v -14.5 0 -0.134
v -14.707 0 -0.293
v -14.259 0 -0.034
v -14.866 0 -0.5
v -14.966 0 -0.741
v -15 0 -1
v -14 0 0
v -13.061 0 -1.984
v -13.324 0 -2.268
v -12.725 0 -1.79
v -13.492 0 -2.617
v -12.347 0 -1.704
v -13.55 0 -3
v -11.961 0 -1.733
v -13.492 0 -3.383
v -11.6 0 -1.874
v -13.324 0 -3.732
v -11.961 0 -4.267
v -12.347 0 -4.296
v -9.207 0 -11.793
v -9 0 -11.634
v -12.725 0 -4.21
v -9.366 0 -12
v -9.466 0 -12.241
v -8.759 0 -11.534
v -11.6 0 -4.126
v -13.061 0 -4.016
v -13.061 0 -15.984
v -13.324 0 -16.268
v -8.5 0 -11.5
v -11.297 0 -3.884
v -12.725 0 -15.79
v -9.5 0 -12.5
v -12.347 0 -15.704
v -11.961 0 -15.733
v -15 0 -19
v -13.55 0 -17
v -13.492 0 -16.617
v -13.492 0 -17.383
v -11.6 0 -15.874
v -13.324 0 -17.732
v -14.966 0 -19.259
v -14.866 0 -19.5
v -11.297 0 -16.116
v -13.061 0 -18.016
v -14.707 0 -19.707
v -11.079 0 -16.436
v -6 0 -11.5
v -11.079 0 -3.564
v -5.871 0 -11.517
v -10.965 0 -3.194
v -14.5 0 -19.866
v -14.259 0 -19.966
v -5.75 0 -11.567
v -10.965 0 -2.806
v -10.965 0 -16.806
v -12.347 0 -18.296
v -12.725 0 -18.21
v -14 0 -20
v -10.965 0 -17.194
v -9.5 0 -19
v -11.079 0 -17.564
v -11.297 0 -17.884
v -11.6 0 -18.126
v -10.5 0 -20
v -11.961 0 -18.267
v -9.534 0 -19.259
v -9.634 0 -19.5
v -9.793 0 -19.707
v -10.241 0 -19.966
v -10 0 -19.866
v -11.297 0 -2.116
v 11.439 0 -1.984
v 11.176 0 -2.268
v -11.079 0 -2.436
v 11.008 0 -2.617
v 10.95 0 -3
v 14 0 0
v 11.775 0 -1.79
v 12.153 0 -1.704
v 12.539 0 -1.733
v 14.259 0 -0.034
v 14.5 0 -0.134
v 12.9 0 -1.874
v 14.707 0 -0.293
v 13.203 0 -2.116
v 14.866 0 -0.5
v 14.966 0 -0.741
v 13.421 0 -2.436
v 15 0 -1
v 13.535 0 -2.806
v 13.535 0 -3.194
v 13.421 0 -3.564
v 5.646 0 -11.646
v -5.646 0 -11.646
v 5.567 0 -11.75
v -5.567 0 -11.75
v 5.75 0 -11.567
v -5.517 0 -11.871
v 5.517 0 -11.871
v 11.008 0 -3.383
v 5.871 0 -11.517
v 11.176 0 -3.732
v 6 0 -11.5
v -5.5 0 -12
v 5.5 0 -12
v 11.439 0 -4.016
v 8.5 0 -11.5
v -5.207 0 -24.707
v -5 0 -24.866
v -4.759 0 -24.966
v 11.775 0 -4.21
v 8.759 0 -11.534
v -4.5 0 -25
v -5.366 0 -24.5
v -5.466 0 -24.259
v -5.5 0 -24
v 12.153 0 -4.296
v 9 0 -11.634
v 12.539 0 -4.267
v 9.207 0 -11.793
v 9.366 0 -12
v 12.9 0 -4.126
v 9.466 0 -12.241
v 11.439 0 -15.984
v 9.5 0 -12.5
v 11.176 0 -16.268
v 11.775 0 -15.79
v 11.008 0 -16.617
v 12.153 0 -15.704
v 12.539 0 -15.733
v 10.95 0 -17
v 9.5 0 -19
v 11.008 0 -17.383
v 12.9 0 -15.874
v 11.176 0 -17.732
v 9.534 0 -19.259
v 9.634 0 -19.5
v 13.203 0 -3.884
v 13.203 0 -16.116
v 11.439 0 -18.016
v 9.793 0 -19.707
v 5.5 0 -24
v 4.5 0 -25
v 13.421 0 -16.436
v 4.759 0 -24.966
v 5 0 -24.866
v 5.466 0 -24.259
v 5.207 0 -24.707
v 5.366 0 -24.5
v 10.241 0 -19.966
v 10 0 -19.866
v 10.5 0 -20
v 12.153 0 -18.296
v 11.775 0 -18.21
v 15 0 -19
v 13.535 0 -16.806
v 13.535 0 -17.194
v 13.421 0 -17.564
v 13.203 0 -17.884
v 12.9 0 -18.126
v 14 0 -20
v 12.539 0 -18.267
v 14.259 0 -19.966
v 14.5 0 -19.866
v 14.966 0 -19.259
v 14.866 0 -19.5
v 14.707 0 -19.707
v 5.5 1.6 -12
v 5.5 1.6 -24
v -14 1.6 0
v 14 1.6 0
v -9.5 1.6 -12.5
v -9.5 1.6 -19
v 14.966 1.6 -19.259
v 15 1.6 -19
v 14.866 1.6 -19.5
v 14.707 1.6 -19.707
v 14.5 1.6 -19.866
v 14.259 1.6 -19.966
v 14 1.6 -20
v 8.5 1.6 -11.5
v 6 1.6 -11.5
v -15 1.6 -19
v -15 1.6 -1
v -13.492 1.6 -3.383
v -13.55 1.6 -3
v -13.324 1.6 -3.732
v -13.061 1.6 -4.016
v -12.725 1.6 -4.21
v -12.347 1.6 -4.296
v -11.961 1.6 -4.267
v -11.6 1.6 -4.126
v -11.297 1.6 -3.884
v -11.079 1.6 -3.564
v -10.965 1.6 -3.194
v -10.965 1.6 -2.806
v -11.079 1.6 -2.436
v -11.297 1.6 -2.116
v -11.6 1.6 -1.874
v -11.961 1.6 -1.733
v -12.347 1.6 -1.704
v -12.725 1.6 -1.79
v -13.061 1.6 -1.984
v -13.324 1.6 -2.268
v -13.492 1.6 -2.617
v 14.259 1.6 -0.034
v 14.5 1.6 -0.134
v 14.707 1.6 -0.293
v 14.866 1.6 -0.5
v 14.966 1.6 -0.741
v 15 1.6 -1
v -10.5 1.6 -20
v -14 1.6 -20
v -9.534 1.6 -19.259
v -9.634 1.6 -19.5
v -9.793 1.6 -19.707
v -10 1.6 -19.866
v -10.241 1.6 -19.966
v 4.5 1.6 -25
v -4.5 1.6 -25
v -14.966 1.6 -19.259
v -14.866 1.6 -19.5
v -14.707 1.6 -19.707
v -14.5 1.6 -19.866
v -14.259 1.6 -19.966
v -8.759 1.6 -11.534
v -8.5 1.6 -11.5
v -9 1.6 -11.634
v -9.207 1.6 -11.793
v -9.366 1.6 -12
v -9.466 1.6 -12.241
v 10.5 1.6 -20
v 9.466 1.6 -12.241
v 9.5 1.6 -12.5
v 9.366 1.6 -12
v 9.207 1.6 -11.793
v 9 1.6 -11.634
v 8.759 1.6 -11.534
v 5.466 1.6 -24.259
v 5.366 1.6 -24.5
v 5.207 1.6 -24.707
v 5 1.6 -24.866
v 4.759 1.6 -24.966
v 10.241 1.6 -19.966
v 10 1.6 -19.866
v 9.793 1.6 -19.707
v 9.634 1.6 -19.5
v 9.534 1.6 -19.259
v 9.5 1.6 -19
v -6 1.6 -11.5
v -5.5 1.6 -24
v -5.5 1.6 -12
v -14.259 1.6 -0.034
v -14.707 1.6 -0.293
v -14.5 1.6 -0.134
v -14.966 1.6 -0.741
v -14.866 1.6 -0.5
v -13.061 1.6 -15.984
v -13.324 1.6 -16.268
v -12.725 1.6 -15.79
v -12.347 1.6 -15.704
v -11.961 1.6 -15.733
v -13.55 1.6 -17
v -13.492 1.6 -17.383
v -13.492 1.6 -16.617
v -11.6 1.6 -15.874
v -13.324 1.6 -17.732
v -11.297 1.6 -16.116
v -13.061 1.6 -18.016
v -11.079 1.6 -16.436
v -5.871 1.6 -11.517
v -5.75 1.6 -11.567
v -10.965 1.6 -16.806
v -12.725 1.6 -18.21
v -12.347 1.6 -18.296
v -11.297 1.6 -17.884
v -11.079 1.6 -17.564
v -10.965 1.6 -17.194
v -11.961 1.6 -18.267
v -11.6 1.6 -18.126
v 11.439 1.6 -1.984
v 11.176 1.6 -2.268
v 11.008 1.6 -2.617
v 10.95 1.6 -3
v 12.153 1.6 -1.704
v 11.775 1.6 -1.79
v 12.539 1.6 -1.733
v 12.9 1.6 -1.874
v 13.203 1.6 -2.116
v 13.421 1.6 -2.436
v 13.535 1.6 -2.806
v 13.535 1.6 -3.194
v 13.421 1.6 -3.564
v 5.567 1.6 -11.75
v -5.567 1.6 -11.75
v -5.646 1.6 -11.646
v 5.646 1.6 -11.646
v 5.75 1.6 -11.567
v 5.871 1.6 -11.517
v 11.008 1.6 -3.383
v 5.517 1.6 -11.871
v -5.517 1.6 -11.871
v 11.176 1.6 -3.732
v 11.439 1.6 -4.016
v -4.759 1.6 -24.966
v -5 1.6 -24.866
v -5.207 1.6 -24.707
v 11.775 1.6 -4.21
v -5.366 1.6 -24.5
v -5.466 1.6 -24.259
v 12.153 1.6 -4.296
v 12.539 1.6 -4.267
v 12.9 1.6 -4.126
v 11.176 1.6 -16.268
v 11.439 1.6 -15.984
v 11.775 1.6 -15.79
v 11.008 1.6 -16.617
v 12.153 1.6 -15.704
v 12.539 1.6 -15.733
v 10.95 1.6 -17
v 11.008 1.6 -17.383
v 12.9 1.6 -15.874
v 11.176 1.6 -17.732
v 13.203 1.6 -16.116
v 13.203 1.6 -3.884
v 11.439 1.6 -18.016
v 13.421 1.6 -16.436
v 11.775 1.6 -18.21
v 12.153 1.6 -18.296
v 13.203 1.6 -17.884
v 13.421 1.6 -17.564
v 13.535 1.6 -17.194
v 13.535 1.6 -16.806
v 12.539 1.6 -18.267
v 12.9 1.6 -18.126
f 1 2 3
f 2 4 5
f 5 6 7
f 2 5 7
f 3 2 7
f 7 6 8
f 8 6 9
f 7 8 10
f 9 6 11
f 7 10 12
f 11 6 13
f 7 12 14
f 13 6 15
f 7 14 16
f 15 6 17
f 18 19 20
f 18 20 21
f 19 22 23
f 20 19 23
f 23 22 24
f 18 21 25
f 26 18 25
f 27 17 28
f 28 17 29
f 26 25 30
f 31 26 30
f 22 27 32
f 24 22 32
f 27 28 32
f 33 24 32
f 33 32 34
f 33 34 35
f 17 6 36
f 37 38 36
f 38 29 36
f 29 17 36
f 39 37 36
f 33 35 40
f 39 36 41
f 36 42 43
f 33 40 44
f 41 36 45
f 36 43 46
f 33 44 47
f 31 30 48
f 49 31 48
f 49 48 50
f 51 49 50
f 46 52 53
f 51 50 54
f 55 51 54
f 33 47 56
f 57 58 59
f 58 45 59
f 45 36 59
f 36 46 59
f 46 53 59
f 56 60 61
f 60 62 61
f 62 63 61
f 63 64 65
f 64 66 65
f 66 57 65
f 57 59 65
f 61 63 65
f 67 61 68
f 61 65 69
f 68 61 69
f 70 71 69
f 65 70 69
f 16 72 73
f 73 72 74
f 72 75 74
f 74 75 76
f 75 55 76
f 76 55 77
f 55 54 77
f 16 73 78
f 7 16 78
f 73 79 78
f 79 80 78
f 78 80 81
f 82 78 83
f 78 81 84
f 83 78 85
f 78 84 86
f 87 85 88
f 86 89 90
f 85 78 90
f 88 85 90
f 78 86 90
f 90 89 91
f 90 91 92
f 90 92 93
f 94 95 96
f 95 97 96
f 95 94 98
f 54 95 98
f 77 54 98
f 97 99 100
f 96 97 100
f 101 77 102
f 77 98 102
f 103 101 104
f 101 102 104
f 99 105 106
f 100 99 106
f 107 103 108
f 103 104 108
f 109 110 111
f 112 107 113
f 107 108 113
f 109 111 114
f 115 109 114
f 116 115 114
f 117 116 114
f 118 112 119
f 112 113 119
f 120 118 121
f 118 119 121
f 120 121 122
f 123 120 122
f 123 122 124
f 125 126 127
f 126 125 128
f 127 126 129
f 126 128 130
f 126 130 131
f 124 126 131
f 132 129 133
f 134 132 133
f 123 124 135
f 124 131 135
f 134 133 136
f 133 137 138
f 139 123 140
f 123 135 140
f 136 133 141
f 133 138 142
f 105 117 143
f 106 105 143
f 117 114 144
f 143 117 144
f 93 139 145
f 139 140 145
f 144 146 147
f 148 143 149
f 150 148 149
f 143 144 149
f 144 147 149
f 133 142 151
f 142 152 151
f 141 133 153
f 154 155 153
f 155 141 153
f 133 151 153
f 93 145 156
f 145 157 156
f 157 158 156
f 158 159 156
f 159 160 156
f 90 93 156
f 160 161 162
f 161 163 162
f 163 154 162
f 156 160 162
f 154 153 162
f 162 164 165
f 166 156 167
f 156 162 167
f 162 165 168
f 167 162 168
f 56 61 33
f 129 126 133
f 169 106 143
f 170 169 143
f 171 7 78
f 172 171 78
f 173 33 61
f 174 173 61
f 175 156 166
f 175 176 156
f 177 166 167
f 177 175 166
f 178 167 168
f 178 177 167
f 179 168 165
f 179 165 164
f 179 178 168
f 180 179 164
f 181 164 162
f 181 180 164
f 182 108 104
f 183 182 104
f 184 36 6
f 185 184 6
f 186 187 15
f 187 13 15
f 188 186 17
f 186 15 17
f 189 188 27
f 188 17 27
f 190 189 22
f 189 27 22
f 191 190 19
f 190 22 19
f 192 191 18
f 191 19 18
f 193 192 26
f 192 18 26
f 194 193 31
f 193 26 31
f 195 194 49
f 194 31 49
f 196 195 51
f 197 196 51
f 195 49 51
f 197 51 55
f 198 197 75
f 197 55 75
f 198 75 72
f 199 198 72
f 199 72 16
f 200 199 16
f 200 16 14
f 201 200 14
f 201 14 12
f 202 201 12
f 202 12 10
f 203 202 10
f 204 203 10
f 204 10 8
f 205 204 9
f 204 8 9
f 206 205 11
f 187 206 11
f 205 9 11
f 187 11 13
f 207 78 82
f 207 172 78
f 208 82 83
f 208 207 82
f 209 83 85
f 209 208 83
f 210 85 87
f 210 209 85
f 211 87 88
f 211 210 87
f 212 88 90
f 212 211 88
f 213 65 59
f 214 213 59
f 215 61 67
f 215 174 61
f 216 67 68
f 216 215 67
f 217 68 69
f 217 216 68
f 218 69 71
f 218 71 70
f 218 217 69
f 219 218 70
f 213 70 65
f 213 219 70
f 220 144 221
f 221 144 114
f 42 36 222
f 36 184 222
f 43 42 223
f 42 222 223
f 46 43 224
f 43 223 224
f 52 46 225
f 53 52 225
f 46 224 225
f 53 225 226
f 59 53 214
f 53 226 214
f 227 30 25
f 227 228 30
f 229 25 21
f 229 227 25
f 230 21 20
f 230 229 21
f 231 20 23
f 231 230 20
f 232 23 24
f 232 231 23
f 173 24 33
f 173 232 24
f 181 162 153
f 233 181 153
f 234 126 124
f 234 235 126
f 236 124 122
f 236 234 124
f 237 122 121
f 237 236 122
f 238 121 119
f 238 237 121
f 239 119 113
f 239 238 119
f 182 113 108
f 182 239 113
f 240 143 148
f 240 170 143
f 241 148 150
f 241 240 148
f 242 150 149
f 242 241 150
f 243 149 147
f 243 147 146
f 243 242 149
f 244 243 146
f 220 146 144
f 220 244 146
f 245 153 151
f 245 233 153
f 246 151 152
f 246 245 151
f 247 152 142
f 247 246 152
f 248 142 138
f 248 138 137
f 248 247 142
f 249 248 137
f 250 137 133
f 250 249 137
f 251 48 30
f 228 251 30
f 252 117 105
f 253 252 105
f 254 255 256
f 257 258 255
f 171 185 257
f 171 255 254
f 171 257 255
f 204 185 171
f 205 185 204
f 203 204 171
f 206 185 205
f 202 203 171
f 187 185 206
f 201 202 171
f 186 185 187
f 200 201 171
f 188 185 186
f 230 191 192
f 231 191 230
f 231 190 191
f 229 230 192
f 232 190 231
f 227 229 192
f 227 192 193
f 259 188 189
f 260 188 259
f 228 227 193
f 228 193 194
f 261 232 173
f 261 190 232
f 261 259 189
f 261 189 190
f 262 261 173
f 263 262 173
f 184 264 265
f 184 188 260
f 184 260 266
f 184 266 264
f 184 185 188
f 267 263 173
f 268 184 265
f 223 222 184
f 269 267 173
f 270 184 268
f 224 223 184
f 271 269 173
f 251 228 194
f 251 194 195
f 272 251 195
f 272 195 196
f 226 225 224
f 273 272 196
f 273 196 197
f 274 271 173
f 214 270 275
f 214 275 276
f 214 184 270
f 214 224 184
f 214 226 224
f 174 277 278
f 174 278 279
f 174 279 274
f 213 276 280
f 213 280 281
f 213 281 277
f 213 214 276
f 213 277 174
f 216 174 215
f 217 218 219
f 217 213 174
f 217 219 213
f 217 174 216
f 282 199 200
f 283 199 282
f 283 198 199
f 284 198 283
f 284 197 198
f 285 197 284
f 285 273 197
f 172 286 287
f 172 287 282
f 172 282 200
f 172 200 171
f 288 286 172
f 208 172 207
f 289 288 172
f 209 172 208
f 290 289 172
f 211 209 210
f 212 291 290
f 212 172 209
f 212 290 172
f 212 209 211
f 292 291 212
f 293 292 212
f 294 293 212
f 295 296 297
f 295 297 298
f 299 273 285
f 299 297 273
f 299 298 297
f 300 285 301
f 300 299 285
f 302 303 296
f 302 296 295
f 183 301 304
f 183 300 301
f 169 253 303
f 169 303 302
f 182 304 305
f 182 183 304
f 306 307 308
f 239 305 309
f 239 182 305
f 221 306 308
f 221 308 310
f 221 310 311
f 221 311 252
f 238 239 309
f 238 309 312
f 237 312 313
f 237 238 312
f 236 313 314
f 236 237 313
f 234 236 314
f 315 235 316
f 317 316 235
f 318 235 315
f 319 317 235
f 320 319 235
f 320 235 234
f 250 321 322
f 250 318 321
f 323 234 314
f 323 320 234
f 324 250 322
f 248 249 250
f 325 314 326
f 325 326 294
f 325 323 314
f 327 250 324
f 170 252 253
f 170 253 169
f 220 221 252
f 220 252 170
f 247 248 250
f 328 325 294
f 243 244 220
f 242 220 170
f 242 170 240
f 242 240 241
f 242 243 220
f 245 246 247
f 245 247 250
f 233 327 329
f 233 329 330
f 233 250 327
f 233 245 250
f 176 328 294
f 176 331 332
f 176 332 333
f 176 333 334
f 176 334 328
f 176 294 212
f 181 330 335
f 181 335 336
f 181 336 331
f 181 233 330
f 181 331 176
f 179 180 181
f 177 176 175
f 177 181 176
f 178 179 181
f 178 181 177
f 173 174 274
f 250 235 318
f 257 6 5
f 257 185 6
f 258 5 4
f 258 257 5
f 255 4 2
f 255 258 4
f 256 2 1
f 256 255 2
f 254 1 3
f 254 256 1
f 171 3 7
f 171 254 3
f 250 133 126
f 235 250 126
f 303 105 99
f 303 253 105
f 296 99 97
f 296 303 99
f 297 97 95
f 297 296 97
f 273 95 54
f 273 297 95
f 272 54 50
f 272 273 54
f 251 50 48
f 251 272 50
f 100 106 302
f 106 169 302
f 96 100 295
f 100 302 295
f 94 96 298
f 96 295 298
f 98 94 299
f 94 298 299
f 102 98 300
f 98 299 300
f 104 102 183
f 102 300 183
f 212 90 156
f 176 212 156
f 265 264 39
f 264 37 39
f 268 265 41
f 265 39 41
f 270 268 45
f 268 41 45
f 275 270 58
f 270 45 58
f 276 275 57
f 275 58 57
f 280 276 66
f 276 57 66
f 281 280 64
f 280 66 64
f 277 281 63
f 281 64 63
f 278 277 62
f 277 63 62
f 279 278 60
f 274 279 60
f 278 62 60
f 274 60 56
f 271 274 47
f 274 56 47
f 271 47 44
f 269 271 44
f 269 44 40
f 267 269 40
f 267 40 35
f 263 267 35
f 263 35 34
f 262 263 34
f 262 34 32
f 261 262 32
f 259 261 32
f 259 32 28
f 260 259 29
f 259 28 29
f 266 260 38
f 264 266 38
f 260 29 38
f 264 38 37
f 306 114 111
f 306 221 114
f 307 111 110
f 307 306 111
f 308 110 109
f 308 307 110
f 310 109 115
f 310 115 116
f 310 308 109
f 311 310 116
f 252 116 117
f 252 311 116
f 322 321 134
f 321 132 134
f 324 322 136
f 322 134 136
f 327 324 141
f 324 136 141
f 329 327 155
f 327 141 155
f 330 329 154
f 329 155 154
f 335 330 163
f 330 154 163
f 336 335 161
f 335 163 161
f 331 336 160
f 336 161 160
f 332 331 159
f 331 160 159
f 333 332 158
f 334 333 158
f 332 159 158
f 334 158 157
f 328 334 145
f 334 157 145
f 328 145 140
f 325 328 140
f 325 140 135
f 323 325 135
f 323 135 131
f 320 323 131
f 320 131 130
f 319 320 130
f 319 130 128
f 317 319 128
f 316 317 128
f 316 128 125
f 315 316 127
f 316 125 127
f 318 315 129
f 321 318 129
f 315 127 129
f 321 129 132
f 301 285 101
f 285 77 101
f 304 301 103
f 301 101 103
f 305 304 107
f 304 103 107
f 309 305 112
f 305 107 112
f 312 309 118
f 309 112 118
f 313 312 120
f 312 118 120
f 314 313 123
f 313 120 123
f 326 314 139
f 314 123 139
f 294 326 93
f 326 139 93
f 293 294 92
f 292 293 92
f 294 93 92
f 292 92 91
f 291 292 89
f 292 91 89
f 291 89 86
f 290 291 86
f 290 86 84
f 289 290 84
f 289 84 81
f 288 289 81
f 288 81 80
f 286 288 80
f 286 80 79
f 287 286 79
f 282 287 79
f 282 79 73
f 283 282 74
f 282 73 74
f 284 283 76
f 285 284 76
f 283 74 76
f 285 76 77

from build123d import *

# Parameters (mm, degrees)
BOSS_EXTRUDE1_DEPTH      = 1.6
FILLET1_R                = 1
M2_CLEARANCE_HOLE1_D     = 2.6
M2_CLEARANCE_HOLE1_DEPTH = 1.6
M2_CLEARANCE_HOLE1_TIP   = 0.781118805
FILLET2_R                = 0.5


with BuildPart() as part:
    # Sketch1 → Boss-Extrude1 (new body)
    with BuildSketch(Plane(origin=(0, 0, 0), x_dir=(1, 0, 0), z_dir=(0, 1, 0))):
        Polygon((-15, 20), (-15, 0), (15, 0), (15, 20), (9.5, 20), (9.5, 11.5), (5.5, 11.5), (5.5, 25), (-5.5, 25), (-5.5, 11.5), (-9.5, 11.5), (-9.5, 20), align=None)
    extrude(amount=BOSS_EXTRUDE1_DEPTH)

    # Fillet1
    fillet1_edges = [part.edges().sort_by_distance(p)[0] for p in [
        (-9.5, 0.8, -20),
        (-9.5, 0.8, -11.5),
        (-5.5, 0.8, -25),
        (5.5, 0.8, -25),
        (9.5, 0.8, -11.5),
        (9.5, 0.8, -20),
        (15, 0.8, -20),
        (15, 0.8, 0),
        (-15, 0.8, 0),
        (-15, 0.8, -20),
    ]]
    fillet(fillet1_edges, radius=FILLET1_R)

    # M2 Clearance Hole1
    with Locations(Plane(origin=(0, 1.6, 0), x_dir=(1, 0, 0), z_dir=(0, 1, 0))):
        with Locations((-12.25, 17), (-12.25, 3), (12.25, 3), (12.25, 17)):
            Hole(M2_CLEARANCE_HOLE1_D / 2, depth=M2_CLEARANCE_HOLE1_DEPTH)
            with Locations((0, 0, -(M2_CLEARANCE_HOLE1_DEPTH + M2_CLEARANCE_HOLE1_TIP / 2))):  # 118° drill point
                Cone(0, M2_CLEARANCE_HOLE1_D / 2, M2_CLEARANCE_HOLE1_TIP, mode=Mode.SUBTRACT)

    # Fillet2
    fillet2_edges = [part.edges().sort_by_distance(p)[0] for p in [
        (-5.5, 0.8, -11.5),
        (5.5, 0.8, -11.5),
    ]]
    fillet(fillet2_edges, radius=FILLET2_R)


solid = part.part
